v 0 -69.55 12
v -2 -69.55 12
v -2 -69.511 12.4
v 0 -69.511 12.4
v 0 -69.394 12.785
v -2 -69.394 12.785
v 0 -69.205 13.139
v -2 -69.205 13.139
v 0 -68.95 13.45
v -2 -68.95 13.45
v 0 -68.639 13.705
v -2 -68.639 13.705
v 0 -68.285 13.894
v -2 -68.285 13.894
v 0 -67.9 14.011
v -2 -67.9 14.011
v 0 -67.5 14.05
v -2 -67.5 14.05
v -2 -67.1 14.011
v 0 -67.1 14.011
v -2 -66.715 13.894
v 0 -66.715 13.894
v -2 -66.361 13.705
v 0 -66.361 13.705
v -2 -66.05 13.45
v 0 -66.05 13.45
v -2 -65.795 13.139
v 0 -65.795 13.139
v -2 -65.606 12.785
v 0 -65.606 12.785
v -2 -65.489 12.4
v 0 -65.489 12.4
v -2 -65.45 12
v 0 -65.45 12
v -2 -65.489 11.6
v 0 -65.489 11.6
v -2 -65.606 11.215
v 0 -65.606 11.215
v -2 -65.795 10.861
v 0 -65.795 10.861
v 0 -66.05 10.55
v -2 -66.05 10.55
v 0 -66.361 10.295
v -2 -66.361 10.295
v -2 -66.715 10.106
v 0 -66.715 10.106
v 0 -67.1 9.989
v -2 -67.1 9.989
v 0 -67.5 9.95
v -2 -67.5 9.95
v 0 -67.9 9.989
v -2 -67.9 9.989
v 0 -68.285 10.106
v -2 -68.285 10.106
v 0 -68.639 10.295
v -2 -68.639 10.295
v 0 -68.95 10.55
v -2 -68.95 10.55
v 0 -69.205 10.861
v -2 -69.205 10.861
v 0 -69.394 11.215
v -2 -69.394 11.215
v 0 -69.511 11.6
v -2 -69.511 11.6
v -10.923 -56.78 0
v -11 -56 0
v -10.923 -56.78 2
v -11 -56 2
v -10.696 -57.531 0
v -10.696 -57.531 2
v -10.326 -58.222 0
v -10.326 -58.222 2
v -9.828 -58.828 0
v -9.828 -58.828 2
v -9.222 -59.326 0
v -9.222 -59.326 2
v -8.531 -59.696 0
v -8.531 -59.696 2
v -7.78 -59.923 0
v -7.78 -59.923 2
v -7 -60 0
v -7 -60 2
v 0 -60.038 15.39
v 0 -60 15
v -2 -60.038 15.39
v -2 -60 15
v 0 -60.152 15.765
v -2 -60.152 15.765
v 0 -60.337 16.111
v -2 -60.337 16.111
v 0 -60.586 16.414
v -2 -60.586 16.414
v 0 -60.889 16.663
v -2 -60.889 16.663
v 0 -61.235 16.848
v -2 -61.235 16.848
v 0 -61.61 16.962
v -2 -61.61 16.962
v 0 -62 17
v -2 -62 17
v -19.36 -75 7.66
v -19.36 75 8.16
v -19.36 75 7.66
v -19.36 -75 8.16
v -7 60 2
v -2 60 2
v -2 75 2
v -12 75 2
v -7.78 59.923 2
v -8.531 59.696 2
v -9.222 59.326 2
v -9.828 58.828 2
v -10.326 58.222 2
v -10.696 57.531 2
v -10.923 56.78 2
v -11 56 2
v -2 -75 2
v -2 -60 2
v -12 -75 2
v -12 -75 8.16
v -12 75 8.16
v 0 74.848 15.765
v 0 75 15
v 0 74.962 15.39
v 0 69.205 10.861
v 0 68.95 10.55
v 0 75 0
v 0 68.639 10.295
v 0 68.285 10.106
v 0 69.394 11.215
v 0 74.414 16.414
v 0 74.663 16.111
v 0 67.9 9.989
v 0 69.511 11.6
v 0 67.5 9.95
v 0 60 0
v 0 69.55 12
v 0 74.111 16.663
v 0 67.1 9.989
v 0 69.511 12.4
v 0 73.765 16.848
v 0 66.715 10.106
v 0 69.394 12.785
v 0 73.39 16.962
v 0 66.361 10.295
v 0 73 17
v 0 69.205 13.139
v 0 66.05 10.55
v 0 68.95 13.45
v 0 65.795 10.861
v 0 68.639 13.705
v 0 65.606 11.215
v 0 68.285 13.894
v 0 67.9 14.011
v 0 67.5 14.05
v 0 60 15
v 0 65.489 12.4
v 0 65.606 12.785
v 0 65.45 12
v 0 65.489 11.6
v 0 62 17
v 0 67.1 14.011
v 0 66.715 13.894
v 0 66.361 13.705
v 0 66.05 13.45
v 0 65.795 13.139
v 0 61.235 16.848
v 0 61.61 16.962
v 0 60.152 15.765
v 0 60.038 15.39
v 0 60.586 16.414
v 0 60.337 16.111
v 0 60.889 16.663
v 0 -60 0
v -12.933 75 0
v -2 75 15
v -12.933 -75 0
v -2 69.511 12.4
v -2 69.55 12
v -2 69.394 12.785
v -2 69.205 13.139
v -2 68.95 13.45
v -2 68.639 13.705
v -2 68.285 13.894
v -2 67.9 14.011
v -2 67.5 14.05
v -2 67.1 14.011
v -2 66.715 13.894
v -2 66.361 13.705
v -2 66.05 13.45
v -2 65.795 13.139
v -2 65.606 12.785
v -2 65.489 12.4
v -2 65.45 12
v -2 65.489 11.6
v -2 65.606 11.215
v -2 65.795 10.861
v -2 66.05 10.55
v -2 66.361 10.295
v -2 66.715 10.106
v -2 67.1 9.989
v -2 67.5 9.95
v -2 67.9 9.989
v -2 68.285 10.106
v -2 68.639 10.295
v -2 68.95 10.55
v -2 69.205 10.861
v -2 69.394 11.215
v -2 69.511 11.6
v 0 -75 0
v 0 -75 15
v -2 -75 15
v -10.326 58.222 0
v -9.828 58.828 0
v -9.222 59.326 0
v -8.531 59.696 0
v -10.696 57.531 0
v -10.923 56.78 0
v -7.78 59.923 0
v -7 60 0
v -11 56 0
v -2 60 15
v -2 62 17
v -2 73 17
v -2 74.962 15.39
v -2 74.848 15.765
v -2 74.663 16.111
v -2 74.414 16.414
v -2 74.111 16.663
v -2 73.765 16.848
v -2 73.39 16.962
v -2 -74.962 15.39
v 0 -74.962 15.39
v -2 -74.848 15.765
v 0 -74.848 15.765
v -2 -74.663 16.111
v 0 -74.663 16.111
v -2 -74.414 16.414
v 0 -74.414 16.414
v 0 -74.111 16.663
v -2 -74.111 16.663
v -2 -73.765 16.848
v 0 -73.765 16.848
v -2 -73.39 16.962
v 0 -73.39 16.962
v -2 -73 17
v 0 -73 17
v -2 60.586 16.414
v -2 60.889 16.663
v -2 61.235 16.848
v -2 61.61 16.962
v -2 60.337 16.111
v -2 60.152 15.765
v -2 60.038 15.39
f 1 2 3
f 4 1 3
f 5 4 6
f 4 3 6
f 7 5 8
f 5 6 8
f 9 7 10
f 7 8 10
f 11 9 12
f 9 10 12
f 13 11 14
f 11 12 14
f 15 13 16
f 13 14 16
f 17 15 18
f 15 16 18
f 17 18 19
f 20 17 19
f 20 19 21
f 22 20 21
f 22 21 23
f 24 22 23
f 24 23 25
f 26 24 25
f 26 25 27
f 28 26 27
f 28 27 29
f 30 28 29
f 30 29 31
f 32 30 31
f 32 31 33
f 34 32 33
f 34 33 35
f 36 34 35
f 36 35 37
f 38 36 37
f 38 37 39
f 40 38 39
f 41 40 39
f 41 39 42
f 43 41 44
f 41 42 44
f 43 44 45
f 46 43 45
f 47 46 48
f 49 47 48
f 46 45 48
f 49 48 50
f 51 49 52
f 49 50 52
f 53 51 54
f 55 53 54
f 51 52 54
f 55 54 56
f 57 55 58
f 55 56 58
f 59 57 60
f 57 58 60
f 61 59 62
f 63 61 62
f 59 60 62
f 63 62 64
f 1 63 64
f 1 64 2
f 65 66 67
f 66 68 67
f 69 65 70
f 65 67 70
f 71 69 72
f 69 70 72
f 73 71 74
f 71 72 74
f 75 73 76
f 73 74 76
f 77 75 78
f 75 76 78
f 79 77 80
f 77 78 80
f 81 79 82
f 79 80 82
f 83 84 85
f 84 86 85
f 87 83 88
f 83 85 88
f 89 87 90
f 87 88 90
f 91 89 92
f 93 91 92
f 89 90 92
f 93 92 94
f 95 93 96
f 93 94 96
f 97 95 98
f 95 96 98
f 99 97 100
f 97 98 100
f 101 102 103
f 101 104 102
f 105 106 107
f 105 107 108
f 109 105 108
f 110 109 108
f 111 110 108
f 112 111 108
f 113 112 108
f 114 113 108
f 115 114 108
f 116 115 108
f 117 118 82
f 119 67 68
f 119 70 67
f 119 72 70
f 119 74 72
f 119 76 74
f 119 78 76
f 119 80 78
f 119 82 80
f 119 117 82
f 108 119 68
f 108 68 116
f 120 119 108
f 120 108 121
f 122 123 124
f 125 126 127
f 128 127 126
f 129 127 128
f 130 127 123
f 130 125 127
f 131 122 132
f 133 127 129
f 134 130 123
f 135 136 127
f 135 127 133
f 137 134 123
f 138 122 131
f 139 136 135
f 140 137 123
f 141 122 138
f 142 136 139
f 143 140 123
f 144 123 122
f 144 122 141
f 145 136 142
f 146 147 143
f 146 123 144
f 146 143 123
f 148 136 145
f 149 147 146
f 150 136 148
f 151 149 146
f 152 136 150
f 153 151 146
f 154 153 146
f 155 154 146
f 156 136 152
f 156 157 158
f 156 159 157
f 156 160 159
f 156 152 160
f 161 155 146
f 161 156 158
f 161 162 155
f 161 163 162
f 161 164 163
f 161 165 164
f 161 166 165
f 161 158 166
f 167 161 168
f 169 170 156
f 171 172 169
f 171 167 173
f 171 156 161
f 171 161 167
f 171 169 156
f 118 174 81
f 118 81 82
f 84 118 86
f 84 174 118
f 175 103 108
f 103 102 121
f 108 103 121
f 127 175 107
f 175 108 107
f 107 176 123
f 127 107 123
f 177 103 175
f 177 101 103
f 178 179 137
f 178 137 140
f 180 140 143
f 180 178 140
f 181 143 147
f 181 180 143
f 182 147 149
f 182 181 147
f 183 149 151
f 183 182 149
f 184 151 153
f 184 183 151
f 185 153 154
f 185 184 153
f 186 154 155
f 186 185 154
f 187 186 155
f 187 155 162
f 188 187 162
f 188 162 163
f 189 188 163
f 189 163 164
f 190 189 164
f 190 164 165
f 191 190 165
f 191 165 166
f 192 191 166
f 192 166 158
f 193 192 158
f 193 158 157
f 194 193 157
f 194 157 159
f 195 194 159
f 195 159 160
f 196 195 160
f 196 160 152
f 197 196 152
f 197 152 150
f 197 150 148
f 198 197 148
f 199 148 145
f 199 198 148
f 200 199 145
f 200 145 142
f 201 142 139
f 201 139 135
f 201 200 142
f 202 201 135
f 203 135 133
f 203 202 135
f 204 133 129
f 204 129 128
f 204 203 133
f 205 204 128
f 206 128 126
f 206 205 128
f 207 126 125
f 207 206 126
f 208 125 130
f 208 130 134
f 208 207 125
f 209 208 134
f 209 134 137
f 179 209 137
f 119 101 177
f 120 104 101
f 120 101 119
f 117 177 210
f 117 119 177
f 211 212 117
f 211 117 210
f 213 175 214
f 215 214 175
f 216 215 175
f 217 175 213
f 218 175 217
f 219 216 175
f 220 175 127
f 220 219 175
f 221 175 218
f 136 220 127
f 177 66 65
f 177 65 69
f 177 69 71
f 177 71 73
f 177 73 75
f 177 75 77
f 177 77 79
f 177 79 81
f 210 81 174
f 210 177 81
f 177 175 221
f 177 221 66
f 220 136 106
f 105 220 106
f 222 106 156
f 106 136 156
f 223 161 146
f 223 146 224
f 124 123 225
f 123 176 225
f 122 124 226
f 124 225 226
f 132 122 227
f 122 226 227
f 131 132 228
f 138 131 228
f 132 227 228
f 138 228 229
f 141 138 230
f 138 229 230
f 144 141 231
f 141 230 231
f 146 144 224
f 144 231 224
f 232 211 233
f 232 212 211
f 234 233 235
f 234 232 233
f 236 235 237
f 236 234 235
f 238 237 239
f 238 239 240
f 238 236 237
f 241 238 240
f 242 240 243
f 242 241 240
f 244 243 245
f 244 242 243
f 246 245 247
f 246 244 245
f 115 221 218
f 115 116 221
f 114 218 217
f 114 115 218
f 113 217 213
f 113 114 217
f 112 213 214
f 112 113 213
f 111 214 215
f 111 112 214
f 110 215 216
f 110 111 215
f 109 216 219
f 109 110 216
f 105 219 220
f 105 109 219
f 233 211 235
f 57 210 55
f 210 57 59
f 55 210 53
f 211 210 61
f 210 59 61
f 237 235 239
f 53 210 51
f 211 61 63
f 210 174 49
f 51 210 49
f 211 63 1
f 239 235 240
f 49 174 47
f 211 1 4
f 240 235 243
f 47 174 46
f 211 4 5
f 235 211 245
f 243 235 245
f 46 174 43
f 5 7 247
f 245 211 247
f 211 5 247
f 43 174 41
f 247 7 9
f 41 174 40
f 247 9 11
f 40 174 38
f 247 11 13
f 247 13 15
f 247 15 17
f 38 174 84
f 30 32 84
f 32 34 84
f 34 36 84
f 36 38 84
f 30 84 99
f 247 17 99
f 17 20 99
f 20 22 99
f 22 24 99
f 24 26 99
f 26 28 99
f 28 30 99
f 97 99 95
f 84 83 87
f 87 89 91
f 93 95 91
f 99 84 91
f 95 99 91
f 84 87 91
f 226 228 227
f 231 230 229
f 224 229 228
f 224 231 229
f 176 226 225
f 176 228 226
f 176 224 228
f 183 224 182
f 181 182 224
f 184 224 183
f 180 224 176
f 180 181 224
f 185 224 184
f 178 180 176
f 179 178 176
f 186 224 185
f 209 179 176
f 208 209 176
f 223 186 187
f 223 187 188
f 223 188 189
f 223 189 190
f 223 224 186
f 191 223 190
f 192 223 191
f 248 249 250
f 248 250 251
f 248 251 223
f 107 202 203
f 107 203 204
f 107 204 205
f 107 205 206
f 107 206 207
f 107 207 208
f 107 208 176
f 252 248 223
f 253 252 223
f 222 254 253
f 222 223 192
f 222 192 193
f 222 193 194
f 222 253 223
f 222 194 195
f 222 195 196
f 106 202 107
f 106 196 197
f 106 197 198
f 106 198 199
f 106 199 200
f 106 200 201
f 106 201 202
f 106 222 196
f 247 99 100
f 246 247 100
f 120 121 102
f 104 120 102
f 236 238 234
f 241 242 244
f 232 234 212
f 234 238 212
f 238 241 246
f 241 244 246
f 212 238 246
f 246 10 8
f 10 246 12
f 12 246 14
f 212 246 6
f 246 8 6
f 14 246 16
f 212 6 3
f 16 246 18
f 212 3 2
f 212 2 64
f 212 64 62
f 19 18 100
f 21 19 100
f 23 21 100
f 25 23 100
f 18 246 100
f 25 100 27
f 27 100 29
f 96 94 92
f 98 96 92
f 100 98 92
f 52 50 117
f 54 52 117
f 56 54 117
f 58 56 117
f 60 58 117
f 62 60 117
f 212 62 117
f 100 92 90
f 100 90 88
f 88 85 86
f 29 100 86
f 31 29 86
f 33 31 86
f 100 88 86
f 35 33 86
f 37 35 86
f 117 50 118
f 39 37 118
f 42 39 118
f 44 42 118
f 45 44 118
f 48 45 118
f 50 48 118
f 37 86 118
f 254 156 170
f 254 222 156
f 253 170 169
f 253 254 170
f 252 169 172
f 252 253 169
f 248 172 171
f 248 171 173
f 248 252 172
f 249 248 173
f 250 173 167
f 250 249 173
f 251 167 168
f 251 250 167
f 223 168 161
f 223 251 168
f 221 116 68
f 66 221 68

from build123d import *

# Parameters (mm, degrees)
F1_DEPTH = 75
F3_D     = 4.1
F2_W     = 60
F2_H     = 17
F4_DEPTH = 11
F5_R     = 4
F6_R     = 2


with BuildPart() as f1:
    # F0 (on Front) → F1 (new body)
    with BuildSketch(Plane.XZ):
        Polygon((-19.3604914132, 7.6604444312), (-12.9326153163, 0), (0, 0), (0, 17), (-2, 17), (-2, 2), (-12, 2), (-12, 8.1604444312), (-19.3604914132, 8.1604444312), align=None)
    extrude(amount=F1_DEPTH)

    # F3 (through all)
    with Locations(Plane.YZ):
        with Locations((-67.5, 12)):
            Hole(F3_D / 2)

    # F2 (on face) → F4 (cut)
    with BuildSketch(Plane.YZ):
        with Locations((-30, 8.5)):
            Rectangle(F2_W, F2_H)
    extrude(amount=-F4_DEPTH, mode=Mode.SUBTRACT)

    # F5
    f5_edges = [f1.edges().sort_by_distance(p)[0] for p in [
        (-11, -60, 1),
    ]]
    fillet(f5_edges, radius=F5_R)

    # F6
    f6_edges = [f1.edges().sort_by_distance(p)[0] for p in [
        (-1, -60, 17),
        (-1, -75, 17),
    ]]
    fillet(f6_edges, radius=F6_R)

    # F7: F1 across face


with BuildPart() as f1_1:
    add(f1.part)
    add(f1.part.mirror(Plane(origin=(-14.4459717542, 0, 4.9195457807), x_dir=(1, 0, 0), z_dir=(0, 1, 0))))


solid = f1_1.part
